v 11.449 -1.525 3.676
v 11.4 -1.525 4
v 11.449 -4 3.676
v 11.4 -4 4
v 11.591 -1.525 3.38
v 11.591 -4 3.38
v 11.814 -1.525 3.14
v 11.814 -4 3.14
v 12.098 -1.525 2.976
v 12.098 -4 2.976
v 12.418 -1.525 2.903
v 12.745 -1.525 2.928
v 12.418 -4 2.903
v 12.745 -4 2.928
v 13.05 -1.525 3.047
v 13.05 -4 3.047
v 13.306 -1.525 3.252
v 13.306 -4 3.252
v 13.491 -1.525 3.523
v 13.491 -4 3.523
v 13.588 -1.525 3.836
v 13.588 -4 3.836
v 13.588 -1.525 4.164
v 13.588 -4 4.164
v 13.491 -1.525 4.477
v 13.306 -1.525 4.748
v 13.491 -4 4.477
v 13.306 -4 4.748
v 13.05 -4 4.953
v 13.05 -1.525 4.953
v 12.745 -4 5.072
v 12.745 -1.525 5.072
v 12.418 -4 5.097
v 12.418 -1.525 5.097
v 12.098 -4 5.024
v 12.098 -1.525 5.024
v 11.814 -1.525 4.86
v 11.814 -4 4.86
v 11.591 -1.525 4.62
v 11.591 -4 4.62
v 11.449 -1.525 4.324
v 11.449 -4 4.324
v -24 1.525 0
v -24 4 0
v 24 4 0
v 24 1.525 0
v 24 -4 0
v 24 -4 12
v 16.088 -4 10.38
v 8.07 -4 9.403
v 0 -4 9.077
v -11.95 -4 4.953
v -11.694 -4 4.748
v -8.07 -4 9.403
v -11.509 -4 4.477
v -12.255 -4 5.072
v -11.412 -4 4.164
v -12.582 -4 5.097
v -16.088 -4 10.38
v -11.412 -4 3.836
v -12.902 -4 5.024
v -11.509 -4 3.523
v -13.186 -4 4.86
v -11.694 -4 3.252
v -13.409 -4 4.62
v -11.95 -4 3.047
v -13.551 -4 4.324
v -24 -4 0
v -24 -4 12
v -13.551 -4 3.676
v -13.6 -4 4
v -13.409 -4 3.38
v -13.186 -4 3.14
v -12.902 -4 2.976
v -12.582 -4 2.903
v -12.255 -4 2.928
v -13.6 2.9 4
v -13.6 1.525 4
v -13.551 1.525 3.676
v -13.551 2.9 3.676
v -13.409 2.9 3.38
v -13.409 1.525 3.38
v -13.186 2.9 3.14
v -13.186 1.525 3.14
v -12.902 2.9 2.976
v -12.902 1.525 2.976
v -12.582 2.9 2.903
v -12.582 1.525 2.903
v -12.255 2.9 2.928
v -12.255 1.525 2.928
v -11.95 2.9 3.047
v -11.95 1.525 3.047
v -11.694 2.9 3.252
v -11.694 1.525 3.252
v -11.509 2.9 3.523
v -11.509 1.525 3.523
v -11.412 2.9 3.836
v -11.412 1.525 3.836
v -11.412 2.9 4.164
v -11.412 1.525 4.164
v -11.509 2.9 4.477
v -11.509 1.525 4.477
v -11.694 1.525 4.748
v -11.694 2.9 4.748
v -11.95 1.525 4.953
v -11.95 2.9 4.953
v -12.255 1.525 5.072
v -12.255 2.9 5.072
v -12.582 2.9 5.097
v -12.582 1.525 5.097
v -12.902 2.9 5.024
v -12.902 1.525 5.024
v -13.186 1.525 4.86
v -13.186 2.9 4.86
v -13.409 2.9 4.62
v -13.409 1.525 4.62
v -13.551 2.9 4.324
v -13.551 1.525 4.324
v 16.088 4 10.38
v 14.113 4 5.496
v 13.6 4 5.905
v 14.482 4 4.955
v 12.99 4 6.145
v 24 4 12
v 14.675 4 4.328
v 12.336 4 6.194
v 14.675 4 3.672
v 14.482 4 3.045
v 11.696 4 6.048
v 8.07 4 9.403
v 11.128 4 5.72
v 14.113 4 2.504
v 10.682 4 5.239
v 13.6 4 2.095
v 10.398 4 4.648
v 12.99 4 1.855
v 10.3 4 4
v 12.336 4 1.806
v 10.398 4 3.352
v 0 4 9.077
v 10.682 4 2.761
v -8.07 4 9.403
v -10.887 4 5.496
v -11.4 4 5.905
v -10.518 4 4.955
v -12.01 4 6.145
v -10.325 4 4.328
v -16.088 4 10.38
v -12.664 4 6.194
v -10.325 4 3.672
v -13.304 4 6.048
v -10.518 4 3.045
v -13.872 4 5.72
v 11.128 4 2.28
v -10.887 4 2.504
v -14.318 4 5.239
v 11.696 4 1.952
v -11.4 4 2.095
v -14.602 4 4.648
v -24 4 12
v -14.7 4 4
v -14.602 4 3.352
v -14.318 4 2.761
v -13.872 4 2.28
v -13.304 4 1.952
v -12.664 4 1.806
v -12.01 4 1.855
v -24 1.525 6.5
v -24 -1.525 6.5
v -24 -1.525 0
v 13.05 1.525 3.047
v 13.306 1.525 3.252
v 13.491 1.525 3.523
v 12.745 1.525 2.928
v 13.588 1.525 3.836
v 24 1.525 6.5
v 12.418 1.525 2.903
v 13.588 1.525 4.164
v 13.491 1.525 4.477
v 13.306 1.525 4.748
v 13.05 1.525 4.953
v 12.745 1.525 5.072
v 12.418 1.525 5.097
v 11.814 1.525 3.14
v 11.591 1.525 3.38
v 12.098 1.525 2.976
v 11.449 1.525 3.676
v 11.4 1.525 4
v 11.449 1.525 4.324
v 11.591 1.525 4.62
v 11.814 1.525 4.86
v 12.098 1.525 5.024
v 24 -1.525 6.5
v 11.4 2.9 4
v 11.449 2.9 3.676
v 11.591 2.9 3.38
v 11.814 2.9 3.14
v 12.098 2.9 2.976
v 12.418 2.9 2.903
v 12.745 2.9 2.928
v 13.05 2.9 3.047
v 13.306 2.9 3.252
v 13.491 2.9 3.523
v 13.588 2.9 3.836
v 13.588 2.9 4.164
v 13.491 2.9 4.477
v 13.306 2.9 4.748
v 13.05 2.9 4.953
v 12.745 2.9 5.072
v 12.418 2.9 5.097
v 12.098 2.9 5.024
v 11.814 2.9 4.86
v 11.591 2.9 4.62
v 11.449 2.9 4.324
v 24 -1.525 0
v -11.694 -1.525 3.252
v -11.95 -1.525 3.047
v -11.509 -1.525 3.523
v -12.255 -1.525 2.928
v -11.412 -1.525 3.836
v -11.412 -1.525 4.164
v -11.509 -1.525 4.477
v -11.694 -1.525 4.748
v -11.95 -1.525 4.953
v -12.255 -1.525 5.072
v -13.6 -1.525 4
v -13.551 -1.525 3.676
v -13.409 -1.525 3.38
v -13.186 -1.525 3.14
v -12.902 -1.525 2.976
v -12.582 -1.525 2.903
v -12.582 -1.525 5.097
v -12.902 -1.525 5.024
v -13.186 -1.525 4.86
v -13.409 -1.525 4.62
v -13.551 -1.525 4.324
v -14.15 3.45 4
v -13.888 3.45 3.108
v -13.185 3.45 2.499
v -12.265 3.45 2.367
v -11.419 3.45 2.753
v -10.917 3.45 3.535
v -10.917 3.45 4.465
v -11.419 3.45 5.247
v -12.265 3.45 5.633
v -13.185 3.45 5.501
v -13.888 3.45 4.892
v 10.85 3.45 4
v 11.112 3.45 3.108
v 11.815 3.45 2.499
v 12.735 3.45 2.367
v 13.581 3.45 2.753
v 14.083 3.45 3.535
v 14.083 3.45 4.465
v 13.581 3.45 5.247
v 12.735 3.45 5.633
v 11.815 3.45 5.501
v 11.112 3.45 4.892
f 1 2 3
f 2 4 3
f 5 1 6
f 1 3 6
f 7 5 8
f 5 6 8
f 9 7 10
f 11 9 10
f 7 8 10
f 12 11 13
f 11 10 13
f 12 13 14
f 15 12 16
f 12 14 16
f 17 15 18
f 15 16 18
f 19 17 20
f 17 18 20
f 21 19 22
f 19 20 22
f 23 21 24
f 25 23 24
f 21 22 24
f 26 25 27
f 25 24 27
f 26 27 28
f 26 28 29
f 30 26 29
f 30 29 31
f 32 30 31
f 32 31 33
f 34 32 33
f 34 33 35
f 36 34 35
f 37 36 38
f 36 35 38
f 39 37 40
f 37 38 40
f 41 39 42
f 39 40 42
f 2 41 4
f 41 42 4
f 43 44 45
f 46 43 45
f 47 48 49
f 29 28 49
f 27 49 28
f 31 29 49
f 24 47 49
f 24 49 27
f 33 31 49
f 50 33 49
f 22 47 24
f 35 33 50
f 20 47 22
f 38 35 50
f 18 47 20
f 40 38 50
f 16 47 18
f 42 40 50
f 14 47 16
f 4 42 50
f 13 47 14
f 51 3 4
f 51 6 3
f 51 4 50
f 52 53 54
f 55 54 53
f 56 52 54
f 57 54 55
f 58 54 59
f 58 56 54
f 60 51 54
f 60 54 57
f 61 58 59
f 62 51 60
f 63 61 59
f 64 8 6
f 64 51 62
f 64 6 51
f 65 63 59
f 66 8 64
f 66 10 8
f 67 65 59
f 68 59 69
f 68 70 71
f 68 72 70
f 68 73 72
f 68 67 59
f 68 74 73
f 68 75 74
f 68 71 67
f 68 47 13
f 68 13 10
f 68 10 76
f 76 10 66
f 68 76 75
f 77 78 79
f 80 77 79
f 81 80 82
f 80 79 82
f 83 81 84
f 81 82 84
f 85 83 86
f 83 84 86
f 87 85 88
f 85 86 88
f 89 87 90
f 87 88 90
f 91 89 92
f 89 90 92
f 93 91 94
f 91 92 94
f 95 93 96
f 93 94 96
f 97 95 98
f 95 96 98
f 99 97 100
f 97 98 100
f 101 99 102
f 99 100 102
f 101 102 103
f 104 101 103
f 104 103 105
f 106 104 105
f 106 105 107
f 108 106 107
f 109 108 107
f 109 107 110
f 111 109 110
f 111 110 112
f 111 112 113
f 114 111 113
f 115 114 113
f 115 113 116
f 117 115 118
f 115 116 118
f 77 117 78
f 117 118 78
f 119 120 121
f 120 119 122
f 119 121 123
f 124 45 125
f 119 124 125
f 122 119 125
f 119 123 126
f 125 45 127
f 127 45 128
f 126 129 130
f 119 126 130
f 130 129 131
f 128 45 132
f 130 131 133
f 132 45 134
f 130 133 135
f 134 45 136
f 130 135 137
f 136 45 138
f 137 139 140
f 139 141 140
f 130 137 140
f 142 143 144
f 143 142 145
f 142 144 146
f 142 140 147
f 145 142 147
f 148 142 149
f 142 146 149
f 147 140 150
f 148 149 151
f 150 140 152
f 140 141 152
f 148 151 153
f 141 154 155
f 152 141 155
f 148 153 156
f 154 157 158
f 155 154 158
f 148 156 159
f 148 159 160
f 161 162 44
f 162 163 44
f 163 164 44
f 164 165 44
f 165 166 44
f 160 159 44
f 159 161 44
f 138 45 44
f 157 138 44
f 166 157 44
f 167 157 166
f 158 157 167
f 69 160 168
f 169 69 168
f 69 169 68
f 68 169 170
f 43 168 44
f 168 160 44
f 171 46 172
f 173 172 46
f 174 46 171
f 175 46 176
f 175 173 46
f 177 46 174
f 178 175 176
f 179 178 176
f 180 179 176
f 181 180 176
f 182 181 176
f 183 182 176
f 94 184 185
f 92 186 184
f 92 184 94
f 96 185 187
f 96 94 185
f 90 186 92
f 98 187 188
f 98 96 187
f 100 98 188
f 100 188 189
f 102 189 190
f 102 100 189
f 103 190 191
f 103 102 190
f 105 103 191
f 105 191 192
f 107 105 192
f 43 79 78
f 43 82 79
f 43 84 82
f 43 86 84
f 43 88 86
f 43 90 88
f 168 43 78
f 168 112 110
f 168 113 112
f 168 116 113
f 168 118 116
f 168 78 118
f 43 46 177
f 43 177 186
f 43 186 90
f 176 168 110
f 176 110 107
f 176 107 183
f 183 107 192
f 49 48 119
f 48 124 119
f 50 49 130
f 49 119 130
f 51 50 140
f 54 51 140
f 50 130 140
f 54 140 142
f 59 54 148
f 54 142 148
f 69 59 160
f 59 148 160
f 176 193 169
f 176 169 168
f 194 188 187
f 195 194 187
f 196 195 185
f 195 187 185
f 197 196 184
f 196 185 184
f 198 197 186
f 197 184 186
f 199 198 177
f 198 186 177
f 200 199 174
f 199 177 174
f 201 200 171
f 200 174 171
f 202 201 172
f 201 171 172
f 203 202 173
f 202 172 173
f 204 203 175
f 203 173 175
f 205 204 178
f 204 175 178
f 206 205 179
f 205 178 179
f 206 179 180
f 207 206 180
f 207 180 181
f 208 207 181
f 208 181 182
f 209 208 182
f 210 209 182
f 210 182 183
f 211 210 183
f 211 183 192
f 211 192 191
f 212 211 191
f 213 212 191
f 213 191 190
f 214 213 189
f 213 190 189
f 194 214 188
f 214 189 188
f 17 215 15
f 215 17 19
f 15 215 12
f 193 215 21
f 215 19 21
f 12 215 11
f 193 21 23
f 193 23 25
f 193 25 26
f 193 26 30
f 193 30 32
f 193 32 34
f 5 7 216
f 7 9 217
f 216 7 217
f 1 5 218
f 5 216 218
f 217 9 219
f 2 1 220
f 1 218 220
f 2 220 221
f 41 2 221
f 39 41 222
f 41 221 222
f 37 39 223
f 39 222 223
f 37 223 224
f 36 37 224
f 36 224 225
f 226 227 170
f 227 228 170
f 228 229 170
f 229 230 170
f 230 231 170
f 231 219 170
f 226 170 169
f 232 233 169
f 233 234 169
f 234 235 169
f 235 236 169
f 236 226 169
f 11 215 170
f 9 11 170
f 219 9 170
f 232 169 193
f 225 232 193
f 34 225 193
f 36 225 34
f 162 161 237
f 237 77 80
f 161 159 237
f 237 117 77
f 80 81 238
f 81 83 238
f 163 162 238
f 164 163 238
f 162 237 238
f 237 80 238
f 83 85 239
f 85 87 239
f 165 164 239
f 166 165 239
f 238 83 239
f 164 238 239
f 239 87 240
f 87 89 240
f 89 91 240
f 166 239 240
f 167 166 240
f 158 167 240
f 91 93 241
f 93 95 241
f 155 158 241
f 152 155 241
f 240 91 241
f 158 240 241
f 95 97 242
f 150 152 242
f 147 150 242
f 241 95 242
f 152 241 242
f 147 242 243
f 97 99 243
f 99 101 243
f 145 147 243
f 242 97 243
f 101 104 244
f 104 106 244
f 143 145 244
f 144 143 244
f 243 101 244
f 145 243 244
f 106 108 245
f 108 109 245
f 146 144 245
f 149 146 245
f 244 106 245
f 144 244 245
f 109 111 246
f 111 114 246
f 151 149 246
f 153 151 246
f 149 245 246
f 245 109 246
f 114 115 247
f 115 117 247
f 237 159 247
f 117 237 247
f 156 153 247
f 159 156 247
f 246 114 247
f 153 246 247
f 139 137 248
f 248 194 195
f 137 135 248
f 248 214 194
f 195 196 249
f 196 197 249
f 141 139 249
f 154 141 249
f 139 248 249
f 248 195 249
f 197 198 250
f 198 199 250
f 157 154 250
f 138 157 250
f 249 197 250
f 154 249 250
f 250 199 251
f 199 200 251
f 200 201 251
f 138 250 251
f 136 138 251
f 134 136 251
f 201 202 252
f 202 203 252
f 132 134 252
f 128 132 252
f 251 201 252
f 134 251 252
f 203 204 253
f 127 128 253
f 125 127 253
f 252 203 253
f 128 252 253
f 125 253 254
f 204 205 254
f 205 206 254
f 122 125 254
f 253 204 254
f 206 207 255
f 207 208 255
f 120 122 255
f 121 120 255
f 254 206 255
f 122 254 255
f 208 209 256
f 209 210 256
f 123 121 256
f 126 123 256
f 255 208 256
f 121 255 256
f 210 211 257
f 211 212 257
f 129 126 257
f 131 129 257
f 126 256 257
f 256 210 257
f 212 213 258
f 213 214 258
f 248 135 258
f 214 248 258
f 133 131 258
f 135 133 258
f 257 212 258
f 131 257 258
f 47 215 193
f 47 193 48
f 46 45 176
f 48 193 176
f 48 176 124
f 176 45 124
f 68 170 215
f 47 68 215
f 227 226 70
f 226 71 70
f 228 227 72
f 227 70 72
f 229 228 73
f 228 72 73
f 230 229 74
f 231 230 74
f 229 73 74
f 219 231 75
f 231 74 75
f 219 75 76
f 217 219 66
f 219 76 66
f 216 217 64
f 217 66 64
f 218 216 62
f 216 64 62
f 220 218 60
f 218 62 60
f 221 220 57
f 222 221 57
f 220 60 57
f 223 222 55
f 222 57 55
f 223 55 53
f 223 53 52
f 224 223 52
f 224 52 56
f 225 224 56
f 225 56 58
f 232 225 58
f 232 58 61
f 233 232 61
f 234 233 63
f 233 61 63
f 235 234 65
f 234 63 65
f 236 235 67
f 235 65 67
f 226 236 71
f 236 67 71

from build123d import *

# Parameters (mm, degrees)
BOSS_EXTRUDE1_DEPTH                             = 4
CSK_FOR_M2_FLAT_HEAD_MACHINE_SCREW1_D           = 2.2
CSK_FOR_M2_FLAT_HEAD_MACHINE_SCREW1_CSINK_D     = 4.4
CSK_FOR_M2_FLAT_HEAD_MACHINE_SCREW1_CSINK_ANGLE = 90
SKETCH9_W                                       = 6.5
SKETCH9_H                                       = 3.05
CUT_EXTRUDE2_DEPTH                              = 50.638694584


with BuildPart() as part:
    # Sketch1 → Boss-Extrude1 (new, symmetric)
    with BuildSketch(Plane(origin=(0, 0, 0), x_dir=(1, 0, 0), z_dir=(0, 1, 0))):
        with BuildLine():
            Line((-24, 0), (24, 0))
            Line((24, 0), (24, -12))
            ThreePointArc((24, -12), (0, -9.077288796), (-24, -12))
            Line((-24, -12), (-24, 0))
        make_face()
    extrude(amount=BOSS_EXTRUDE1_DEPTH, both=True)

    # CSK for M2 Flat Head Machine Screw1 (through all)
    with Locations(Plane(origin=(0, 4, 0), x_dir=(1, 0, 0), z_dir=(0, 1, 0))):
        with Locations((12.5, -4), (-12.5, -4)):
            CounterSinkHole(CSK_FOR_M2_FLAT_HEAD_MACHINE_SCREW1_D / 2, CSK_FOR_M2_FLAT_HEAD_MACHINE_SCREW1_CSINK_D / 2, counter_sink_angle=CSK_FOR_M2_FLAT_HEAD_MACHINE_SCREW1_CSINK_ANGLE)

    # Sketch9 → Cut-Extrude2 (cut, through all)
    with BuildSketch(Plane.ZY.offset(24)):
        with Locations((3.25, 0)):
            Rectangle(SKETCH9_W, SKETCH9_H)
    extrude(amount=-CUT_EXTRUDE2_DEPTH, mode=Mode.SUBTRACT)


solid = part.part
